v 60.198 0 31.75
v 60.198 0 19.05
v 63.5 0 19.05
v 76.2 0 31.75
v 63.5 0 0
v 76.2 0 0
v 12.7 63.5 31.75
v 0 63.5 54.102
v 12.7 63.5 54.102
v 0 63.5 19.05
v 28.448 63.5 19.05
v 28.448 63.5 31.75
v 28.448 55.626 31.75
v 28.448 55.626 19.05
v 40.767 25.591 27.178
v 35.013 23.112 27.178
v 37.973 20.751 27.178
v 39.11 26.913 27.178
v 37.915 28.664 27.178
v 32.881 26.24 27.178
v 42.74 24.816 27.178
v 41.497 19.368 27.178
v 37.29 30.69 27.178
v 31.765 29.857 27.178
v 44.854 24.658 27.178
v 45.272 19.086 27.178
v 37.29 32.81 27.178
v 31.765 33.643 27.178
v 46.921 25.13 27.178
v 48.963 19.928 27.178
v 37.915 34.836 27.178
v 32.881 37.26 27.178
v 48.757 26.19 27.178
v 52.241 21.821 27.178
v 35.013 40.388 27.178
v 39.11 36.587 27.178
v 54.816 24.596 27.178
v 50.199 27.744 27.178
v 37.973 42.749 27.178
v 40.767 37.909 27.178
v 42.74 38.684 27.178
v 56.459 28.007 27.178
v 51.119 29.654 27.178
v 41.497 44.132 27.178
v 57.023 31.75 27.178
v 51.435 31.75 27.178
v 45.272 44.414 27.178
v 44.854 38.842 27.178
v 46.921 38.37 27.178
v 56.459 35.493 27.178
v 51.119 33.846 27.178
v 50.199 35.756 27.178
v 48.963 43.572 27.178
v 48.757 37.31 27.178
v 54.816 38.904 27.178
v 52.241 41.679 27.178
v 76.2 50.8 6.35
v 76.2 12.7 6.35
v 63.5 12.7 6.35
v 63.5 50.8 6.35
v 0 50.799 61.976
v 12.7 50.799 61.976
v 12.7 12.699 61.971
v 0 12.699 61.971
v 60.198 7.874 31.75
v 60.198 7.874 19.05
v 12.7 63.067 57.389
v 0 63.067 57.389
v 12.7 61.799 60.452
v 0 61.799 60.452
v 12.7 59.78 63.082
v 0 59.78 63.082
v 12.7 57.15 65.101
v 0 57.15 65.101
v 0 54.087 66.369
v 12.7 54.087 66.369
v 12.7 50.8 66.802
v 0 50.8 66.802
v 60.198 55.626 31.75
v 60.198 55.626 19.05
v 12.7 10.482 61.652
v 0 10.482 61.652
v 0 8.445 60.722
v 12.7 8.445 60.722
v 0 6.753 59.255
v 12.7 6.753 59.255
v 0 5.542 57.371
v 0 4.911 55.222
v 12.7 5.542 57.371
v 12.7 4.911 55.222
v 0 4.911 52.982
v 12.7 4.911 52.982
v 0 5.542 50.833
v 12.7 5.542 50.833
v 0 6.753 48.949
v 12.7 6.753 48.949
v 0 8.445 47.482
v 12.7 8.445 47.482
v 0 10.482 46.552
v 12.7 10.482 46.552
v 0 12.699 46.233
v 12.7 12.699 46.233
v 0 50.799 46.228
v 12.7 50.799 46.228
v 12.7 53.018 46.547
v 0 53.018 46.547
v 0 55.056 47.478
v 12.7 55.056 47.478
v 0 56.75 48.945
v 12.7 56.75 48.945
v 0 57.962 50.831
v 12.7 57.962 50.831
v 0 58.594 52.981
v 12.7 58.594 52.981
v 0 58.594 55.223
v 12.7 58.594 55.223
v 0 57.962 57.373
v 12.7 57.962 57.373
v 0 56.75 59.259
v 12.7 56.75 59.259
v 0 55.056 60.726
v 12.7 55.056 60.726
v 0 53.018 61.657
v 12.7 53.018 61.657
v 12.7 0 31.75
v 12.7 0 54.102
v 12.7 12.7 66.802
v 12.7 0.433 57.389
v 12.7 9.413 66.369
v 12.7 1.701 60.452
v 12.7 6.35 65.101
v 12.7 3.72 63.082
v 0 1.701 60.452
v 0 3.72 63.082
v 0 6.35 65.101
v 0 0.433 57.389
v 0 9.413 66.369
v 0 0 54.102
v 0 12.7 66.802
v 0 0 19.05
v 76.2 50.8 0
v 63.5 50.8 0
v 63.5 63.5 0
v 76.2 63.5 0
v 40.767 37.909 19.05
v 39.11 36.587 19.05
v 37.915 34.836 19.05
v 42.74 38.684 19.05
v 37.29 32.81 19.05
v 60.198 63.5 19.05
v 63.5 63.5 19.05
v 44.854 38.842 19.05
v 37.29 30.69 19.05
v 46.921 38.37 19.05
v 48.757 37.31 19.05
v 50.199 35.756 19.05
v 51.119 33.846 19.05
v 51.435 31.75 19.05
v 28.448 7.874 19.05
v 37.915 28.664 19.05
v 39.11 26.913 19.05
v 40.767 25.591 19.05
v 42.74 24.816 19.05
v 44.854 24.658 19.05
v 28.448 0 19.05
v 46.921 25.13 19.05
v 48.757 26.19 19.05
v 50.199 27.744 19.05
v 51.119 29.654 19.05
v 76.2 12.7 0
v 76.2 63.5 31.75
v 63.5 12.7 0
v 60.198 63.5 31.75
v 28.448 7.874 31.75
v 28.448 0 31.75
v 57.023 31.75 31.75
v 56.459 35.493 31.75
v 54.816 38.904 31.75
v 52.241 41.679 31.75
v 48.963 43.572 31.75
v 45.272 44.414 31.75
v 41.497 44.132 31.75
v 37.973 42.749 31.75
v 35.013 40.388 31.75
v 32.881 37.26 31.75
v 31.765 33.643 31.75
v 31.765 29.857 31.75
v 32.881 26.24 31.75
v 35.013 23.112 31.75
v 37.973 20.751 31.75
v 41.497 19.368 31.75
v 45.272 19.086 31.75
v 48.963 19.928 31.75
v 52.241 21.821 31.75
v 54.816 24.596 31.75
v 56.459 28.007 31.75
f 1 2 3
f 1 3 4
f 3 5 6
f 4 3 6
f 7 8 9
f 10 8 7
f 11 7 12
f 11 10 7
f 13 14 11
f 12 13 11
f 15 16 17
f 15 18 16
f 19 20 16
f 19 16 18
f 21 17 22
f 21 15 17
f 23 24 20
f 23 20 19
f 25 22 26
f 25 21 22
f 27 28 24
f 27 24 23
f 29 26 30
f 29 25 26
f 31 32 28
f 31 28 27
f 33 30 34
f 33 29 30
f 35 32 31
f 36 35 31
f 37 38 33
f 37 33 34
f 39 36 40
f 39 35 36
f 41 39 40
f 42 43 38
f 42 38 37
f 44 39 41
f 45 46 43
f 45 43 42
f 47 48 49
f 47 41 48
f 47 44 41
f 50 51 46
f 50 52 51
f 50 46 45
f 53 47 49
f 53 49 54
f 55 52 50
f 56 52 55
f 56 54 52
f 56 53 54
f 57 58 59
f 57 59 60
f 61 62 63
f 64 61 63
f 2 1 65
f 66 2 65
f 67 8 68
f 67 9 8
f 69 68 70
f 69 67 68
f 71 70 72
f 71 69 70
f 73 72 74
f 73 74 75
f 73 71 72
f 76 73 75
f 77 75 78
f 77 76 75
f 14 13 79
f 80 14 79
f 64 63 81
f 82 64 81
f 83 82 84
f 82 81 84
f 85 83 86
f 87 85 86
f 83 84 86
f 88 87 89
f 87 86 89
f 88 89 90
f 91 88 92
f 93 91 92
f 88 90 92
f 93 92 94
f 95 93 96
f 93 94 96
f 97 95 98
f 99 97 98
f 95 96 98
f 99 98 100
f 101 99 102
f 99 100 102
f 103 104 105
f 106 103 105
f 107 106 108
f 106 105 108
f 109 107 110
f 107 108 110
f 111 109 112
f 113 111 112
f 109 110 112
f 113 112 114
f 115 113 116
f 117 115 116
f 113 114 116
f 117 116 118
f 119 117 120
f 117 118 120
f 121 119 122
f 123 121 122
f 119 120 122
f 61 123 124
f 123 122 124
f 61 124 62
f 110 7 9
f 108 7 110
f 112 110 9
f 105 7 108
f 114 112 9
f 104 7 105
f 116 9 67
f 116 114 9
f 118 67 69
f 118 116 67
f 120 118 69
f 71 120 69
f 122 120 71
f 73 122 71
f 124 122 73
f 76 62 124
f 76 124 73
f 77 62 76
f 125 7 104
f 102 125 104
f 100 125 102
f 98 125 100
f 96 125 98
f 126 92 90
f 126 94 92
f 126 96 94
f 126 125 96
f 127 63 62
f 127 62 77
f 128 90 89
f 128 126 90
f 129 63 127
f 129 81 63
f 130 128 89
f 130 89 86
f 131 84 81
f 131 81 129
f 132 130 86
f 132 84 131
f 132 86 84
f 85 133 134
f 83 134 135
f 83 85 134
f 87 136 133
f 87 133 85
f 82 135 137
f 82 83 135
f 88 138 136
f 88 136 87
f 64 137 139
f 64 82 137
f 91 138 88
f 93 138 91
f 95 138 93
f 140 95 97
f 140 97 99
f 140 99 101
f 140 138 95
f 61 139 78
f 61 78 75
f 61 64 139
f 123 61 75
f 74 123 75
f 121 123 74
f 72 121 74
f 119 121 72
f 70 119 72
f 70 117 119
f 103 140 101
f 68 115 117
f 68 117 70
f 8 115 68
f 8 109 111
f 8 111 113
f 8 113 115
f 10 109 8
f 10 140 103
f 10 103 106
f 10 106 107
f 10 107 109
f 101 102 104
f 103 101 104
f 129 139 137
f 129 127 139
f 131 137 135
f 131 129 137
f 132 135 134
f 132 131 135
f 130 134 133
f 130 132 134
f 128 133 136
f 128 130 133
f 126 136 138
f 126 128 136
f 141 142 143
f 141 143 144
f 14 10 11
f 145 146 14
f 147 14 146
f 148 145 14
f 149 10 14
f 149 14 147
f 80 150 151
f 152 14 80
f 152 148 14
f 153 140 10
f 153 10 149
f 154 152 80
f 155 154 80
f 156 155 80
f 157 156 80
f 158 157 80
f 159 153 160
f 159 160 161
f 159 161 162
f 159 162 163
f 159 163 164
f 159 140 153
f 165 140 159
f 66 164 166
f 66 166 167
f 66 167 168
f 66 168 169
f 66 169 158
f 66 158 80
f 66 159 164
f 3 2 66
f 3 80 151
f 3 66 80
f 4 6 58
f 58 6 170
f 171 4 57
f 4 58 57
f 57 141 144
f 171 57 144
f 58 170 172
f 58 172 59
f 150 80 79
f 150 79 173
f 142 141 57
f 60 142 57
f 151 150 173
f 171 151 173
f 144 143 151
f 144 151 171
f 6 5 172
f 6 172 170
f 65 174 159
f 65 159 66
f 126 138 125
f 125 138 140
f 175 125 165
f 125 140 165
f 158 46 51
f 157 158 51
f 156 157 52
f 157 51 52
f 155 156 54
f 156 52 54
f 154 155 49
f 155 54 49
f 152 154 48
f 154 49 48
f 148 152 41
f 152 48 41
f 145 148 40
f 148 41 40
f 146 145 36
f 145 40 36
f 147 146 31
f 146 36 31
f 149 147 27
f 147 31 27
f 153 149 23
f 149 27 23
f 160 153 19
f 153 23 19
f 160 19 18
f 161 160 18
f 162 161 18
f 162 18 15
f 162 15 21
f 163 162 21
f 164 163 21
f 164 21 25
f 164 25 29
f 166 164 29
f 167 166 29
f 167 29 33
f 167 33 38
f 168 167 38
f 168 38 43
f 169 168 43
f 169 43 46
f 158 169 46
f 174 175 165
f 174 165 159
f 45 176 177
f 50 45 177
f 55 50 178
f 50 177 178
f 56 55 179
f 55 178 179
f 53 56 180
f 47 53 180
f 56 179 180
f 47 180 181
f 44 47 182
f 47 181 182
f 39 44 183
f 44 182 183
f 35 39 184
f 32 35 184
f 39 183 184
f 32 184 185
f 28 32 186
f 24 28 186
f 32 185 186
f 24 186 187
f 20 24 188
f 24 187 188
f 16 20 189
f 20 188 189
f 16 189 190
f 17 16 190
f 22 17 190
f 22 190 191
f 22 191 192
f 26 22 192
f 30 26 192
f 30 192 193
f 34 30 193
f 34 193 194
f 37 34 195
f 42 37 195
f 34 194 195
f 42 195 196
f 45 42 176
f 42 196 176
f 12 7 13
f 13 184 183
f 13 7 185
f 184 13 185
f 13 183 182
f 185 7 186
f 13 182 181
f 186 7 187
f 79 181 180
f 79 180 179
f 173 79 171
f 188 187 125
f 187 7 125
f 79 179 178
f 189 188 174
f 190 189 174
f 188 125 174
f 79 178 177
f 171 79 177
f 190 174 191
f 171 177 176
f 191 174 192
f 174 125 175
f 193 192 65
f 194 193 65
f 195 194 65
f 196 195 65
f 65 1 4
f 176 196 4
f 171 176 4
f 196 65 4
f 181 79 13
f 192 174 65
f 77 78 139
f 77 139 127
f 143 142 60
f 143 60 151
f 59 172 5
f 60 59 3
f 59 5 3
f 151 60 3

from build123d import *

# Parameters (mm, degrees)
F0_W      = 76.2
F0_H      = 63.5
F1_DEPTH  = 66.802
F2_W      = 63.5
F2_H      = 35.052
F2_H_2    = 19.05
F3_DEPTH  = 63.501
F4_R      = 12.7
F5_W      = 38.1
F5_H      = 6.35
F6_DEPTH  = 76.201
F8_DEPTH  = 12.701
F9_W      = 31.75
F9_H      = 7.874
F10_DEPTH = 31.751
F11_R     = 12.7
F12_DEPTH = 4.572
F13_R     = 7.112
F14_DEPTH = 27.179


with BuildPart() as f1:
    # F0 (on Top) → F1 (new body)
    with BuildSketch(Plane.XY):
        with Locations((38.1, 31.75)):
            Rectangle(F0_W, F0_H)
    extrude(amount=F1_DEPTH)

    # F2 (on face) → F3 (cut, through all)
    with BuildSketch(Plane.XZ):
        with Locations((44.45, 49.276)):
            Rectangle(F2_W, F2_H)
        with Locations((31.75, 9.525)):
            Rectangle(F2_W, F2_H_2)
    extrude(amount=-F3_DEPTH, mode=Mode.SUBTRACT)

    # F4
    f4_edges = [f1.edges().sort_by_distance(p)[0] for p in [
        (6.35, 0, 66.802),
        (6.35, 63.5, 66.802),
    ]]
    fillet(f4_edges, radius=F4_R)

    # F5 (on face) → F6 (cut, through all)
    with BuildSketch(Plane.YZ.offset(76.2)):
        with Locations((31.75, 3.175)):
            Rectangle(F5_W, F5_H)
    extrude(amount=-F6_DEPTH, mode=Mode.SUBTRACT)

    # F7 (on face) → F8 (cut, through all)
    with BuildSketch(Plane.YZ.offset(12.7)):
        with BuildLine():
            Line((50.799009, 61.976), (12.699009, 61.971204))
            ThreePointArc((12.699009, 61.971204), (4.830796, 54.102), (12.699009, 46.232796))
            Line((12.699009, 46.232796), (50.799009, 46.228))
            ThreePointArc((50.799009, 46.228), (58.674, 54.102), (50.799009, 61.976))
        make_face()
    extrude(amount=-F8_DEPTH, mode=Mode.SUBTRACT)

    # F9 (on face) → F10 (cut, through all)
    with BuildSketch(Plane.XY.offset(31.75)):
        with Locations((44.323, 59.563)):
            Rectangle(F9_W, F9_H)
        with Locations((44.323, 3.937)):
            Rectangle(F9_W, F9_H)
    extrude(amount=-F10_DEPTH, mode=Mode.SUBTRACT)

    # F11 (on face) → F12 (cut)
    with BuildSketch(Plane.XY.offset(31.75)):
        with Locations((44.323, 31.75)):
            Circle(F11_R)
    extrude(amount=-F12_DEPTH, mode=Mode.SUBTRACT)

    # F13 (on face) → F14 (cut, through all)
    with BuildSketch(Plane.XY.offset(27.178)):
        with Locations((44.323, 31.75)):
            Circle(F13_R)
    extrude(amount=-F14_DEPTH, mode=Mode.SUBTRACT)


solid = f1.part
